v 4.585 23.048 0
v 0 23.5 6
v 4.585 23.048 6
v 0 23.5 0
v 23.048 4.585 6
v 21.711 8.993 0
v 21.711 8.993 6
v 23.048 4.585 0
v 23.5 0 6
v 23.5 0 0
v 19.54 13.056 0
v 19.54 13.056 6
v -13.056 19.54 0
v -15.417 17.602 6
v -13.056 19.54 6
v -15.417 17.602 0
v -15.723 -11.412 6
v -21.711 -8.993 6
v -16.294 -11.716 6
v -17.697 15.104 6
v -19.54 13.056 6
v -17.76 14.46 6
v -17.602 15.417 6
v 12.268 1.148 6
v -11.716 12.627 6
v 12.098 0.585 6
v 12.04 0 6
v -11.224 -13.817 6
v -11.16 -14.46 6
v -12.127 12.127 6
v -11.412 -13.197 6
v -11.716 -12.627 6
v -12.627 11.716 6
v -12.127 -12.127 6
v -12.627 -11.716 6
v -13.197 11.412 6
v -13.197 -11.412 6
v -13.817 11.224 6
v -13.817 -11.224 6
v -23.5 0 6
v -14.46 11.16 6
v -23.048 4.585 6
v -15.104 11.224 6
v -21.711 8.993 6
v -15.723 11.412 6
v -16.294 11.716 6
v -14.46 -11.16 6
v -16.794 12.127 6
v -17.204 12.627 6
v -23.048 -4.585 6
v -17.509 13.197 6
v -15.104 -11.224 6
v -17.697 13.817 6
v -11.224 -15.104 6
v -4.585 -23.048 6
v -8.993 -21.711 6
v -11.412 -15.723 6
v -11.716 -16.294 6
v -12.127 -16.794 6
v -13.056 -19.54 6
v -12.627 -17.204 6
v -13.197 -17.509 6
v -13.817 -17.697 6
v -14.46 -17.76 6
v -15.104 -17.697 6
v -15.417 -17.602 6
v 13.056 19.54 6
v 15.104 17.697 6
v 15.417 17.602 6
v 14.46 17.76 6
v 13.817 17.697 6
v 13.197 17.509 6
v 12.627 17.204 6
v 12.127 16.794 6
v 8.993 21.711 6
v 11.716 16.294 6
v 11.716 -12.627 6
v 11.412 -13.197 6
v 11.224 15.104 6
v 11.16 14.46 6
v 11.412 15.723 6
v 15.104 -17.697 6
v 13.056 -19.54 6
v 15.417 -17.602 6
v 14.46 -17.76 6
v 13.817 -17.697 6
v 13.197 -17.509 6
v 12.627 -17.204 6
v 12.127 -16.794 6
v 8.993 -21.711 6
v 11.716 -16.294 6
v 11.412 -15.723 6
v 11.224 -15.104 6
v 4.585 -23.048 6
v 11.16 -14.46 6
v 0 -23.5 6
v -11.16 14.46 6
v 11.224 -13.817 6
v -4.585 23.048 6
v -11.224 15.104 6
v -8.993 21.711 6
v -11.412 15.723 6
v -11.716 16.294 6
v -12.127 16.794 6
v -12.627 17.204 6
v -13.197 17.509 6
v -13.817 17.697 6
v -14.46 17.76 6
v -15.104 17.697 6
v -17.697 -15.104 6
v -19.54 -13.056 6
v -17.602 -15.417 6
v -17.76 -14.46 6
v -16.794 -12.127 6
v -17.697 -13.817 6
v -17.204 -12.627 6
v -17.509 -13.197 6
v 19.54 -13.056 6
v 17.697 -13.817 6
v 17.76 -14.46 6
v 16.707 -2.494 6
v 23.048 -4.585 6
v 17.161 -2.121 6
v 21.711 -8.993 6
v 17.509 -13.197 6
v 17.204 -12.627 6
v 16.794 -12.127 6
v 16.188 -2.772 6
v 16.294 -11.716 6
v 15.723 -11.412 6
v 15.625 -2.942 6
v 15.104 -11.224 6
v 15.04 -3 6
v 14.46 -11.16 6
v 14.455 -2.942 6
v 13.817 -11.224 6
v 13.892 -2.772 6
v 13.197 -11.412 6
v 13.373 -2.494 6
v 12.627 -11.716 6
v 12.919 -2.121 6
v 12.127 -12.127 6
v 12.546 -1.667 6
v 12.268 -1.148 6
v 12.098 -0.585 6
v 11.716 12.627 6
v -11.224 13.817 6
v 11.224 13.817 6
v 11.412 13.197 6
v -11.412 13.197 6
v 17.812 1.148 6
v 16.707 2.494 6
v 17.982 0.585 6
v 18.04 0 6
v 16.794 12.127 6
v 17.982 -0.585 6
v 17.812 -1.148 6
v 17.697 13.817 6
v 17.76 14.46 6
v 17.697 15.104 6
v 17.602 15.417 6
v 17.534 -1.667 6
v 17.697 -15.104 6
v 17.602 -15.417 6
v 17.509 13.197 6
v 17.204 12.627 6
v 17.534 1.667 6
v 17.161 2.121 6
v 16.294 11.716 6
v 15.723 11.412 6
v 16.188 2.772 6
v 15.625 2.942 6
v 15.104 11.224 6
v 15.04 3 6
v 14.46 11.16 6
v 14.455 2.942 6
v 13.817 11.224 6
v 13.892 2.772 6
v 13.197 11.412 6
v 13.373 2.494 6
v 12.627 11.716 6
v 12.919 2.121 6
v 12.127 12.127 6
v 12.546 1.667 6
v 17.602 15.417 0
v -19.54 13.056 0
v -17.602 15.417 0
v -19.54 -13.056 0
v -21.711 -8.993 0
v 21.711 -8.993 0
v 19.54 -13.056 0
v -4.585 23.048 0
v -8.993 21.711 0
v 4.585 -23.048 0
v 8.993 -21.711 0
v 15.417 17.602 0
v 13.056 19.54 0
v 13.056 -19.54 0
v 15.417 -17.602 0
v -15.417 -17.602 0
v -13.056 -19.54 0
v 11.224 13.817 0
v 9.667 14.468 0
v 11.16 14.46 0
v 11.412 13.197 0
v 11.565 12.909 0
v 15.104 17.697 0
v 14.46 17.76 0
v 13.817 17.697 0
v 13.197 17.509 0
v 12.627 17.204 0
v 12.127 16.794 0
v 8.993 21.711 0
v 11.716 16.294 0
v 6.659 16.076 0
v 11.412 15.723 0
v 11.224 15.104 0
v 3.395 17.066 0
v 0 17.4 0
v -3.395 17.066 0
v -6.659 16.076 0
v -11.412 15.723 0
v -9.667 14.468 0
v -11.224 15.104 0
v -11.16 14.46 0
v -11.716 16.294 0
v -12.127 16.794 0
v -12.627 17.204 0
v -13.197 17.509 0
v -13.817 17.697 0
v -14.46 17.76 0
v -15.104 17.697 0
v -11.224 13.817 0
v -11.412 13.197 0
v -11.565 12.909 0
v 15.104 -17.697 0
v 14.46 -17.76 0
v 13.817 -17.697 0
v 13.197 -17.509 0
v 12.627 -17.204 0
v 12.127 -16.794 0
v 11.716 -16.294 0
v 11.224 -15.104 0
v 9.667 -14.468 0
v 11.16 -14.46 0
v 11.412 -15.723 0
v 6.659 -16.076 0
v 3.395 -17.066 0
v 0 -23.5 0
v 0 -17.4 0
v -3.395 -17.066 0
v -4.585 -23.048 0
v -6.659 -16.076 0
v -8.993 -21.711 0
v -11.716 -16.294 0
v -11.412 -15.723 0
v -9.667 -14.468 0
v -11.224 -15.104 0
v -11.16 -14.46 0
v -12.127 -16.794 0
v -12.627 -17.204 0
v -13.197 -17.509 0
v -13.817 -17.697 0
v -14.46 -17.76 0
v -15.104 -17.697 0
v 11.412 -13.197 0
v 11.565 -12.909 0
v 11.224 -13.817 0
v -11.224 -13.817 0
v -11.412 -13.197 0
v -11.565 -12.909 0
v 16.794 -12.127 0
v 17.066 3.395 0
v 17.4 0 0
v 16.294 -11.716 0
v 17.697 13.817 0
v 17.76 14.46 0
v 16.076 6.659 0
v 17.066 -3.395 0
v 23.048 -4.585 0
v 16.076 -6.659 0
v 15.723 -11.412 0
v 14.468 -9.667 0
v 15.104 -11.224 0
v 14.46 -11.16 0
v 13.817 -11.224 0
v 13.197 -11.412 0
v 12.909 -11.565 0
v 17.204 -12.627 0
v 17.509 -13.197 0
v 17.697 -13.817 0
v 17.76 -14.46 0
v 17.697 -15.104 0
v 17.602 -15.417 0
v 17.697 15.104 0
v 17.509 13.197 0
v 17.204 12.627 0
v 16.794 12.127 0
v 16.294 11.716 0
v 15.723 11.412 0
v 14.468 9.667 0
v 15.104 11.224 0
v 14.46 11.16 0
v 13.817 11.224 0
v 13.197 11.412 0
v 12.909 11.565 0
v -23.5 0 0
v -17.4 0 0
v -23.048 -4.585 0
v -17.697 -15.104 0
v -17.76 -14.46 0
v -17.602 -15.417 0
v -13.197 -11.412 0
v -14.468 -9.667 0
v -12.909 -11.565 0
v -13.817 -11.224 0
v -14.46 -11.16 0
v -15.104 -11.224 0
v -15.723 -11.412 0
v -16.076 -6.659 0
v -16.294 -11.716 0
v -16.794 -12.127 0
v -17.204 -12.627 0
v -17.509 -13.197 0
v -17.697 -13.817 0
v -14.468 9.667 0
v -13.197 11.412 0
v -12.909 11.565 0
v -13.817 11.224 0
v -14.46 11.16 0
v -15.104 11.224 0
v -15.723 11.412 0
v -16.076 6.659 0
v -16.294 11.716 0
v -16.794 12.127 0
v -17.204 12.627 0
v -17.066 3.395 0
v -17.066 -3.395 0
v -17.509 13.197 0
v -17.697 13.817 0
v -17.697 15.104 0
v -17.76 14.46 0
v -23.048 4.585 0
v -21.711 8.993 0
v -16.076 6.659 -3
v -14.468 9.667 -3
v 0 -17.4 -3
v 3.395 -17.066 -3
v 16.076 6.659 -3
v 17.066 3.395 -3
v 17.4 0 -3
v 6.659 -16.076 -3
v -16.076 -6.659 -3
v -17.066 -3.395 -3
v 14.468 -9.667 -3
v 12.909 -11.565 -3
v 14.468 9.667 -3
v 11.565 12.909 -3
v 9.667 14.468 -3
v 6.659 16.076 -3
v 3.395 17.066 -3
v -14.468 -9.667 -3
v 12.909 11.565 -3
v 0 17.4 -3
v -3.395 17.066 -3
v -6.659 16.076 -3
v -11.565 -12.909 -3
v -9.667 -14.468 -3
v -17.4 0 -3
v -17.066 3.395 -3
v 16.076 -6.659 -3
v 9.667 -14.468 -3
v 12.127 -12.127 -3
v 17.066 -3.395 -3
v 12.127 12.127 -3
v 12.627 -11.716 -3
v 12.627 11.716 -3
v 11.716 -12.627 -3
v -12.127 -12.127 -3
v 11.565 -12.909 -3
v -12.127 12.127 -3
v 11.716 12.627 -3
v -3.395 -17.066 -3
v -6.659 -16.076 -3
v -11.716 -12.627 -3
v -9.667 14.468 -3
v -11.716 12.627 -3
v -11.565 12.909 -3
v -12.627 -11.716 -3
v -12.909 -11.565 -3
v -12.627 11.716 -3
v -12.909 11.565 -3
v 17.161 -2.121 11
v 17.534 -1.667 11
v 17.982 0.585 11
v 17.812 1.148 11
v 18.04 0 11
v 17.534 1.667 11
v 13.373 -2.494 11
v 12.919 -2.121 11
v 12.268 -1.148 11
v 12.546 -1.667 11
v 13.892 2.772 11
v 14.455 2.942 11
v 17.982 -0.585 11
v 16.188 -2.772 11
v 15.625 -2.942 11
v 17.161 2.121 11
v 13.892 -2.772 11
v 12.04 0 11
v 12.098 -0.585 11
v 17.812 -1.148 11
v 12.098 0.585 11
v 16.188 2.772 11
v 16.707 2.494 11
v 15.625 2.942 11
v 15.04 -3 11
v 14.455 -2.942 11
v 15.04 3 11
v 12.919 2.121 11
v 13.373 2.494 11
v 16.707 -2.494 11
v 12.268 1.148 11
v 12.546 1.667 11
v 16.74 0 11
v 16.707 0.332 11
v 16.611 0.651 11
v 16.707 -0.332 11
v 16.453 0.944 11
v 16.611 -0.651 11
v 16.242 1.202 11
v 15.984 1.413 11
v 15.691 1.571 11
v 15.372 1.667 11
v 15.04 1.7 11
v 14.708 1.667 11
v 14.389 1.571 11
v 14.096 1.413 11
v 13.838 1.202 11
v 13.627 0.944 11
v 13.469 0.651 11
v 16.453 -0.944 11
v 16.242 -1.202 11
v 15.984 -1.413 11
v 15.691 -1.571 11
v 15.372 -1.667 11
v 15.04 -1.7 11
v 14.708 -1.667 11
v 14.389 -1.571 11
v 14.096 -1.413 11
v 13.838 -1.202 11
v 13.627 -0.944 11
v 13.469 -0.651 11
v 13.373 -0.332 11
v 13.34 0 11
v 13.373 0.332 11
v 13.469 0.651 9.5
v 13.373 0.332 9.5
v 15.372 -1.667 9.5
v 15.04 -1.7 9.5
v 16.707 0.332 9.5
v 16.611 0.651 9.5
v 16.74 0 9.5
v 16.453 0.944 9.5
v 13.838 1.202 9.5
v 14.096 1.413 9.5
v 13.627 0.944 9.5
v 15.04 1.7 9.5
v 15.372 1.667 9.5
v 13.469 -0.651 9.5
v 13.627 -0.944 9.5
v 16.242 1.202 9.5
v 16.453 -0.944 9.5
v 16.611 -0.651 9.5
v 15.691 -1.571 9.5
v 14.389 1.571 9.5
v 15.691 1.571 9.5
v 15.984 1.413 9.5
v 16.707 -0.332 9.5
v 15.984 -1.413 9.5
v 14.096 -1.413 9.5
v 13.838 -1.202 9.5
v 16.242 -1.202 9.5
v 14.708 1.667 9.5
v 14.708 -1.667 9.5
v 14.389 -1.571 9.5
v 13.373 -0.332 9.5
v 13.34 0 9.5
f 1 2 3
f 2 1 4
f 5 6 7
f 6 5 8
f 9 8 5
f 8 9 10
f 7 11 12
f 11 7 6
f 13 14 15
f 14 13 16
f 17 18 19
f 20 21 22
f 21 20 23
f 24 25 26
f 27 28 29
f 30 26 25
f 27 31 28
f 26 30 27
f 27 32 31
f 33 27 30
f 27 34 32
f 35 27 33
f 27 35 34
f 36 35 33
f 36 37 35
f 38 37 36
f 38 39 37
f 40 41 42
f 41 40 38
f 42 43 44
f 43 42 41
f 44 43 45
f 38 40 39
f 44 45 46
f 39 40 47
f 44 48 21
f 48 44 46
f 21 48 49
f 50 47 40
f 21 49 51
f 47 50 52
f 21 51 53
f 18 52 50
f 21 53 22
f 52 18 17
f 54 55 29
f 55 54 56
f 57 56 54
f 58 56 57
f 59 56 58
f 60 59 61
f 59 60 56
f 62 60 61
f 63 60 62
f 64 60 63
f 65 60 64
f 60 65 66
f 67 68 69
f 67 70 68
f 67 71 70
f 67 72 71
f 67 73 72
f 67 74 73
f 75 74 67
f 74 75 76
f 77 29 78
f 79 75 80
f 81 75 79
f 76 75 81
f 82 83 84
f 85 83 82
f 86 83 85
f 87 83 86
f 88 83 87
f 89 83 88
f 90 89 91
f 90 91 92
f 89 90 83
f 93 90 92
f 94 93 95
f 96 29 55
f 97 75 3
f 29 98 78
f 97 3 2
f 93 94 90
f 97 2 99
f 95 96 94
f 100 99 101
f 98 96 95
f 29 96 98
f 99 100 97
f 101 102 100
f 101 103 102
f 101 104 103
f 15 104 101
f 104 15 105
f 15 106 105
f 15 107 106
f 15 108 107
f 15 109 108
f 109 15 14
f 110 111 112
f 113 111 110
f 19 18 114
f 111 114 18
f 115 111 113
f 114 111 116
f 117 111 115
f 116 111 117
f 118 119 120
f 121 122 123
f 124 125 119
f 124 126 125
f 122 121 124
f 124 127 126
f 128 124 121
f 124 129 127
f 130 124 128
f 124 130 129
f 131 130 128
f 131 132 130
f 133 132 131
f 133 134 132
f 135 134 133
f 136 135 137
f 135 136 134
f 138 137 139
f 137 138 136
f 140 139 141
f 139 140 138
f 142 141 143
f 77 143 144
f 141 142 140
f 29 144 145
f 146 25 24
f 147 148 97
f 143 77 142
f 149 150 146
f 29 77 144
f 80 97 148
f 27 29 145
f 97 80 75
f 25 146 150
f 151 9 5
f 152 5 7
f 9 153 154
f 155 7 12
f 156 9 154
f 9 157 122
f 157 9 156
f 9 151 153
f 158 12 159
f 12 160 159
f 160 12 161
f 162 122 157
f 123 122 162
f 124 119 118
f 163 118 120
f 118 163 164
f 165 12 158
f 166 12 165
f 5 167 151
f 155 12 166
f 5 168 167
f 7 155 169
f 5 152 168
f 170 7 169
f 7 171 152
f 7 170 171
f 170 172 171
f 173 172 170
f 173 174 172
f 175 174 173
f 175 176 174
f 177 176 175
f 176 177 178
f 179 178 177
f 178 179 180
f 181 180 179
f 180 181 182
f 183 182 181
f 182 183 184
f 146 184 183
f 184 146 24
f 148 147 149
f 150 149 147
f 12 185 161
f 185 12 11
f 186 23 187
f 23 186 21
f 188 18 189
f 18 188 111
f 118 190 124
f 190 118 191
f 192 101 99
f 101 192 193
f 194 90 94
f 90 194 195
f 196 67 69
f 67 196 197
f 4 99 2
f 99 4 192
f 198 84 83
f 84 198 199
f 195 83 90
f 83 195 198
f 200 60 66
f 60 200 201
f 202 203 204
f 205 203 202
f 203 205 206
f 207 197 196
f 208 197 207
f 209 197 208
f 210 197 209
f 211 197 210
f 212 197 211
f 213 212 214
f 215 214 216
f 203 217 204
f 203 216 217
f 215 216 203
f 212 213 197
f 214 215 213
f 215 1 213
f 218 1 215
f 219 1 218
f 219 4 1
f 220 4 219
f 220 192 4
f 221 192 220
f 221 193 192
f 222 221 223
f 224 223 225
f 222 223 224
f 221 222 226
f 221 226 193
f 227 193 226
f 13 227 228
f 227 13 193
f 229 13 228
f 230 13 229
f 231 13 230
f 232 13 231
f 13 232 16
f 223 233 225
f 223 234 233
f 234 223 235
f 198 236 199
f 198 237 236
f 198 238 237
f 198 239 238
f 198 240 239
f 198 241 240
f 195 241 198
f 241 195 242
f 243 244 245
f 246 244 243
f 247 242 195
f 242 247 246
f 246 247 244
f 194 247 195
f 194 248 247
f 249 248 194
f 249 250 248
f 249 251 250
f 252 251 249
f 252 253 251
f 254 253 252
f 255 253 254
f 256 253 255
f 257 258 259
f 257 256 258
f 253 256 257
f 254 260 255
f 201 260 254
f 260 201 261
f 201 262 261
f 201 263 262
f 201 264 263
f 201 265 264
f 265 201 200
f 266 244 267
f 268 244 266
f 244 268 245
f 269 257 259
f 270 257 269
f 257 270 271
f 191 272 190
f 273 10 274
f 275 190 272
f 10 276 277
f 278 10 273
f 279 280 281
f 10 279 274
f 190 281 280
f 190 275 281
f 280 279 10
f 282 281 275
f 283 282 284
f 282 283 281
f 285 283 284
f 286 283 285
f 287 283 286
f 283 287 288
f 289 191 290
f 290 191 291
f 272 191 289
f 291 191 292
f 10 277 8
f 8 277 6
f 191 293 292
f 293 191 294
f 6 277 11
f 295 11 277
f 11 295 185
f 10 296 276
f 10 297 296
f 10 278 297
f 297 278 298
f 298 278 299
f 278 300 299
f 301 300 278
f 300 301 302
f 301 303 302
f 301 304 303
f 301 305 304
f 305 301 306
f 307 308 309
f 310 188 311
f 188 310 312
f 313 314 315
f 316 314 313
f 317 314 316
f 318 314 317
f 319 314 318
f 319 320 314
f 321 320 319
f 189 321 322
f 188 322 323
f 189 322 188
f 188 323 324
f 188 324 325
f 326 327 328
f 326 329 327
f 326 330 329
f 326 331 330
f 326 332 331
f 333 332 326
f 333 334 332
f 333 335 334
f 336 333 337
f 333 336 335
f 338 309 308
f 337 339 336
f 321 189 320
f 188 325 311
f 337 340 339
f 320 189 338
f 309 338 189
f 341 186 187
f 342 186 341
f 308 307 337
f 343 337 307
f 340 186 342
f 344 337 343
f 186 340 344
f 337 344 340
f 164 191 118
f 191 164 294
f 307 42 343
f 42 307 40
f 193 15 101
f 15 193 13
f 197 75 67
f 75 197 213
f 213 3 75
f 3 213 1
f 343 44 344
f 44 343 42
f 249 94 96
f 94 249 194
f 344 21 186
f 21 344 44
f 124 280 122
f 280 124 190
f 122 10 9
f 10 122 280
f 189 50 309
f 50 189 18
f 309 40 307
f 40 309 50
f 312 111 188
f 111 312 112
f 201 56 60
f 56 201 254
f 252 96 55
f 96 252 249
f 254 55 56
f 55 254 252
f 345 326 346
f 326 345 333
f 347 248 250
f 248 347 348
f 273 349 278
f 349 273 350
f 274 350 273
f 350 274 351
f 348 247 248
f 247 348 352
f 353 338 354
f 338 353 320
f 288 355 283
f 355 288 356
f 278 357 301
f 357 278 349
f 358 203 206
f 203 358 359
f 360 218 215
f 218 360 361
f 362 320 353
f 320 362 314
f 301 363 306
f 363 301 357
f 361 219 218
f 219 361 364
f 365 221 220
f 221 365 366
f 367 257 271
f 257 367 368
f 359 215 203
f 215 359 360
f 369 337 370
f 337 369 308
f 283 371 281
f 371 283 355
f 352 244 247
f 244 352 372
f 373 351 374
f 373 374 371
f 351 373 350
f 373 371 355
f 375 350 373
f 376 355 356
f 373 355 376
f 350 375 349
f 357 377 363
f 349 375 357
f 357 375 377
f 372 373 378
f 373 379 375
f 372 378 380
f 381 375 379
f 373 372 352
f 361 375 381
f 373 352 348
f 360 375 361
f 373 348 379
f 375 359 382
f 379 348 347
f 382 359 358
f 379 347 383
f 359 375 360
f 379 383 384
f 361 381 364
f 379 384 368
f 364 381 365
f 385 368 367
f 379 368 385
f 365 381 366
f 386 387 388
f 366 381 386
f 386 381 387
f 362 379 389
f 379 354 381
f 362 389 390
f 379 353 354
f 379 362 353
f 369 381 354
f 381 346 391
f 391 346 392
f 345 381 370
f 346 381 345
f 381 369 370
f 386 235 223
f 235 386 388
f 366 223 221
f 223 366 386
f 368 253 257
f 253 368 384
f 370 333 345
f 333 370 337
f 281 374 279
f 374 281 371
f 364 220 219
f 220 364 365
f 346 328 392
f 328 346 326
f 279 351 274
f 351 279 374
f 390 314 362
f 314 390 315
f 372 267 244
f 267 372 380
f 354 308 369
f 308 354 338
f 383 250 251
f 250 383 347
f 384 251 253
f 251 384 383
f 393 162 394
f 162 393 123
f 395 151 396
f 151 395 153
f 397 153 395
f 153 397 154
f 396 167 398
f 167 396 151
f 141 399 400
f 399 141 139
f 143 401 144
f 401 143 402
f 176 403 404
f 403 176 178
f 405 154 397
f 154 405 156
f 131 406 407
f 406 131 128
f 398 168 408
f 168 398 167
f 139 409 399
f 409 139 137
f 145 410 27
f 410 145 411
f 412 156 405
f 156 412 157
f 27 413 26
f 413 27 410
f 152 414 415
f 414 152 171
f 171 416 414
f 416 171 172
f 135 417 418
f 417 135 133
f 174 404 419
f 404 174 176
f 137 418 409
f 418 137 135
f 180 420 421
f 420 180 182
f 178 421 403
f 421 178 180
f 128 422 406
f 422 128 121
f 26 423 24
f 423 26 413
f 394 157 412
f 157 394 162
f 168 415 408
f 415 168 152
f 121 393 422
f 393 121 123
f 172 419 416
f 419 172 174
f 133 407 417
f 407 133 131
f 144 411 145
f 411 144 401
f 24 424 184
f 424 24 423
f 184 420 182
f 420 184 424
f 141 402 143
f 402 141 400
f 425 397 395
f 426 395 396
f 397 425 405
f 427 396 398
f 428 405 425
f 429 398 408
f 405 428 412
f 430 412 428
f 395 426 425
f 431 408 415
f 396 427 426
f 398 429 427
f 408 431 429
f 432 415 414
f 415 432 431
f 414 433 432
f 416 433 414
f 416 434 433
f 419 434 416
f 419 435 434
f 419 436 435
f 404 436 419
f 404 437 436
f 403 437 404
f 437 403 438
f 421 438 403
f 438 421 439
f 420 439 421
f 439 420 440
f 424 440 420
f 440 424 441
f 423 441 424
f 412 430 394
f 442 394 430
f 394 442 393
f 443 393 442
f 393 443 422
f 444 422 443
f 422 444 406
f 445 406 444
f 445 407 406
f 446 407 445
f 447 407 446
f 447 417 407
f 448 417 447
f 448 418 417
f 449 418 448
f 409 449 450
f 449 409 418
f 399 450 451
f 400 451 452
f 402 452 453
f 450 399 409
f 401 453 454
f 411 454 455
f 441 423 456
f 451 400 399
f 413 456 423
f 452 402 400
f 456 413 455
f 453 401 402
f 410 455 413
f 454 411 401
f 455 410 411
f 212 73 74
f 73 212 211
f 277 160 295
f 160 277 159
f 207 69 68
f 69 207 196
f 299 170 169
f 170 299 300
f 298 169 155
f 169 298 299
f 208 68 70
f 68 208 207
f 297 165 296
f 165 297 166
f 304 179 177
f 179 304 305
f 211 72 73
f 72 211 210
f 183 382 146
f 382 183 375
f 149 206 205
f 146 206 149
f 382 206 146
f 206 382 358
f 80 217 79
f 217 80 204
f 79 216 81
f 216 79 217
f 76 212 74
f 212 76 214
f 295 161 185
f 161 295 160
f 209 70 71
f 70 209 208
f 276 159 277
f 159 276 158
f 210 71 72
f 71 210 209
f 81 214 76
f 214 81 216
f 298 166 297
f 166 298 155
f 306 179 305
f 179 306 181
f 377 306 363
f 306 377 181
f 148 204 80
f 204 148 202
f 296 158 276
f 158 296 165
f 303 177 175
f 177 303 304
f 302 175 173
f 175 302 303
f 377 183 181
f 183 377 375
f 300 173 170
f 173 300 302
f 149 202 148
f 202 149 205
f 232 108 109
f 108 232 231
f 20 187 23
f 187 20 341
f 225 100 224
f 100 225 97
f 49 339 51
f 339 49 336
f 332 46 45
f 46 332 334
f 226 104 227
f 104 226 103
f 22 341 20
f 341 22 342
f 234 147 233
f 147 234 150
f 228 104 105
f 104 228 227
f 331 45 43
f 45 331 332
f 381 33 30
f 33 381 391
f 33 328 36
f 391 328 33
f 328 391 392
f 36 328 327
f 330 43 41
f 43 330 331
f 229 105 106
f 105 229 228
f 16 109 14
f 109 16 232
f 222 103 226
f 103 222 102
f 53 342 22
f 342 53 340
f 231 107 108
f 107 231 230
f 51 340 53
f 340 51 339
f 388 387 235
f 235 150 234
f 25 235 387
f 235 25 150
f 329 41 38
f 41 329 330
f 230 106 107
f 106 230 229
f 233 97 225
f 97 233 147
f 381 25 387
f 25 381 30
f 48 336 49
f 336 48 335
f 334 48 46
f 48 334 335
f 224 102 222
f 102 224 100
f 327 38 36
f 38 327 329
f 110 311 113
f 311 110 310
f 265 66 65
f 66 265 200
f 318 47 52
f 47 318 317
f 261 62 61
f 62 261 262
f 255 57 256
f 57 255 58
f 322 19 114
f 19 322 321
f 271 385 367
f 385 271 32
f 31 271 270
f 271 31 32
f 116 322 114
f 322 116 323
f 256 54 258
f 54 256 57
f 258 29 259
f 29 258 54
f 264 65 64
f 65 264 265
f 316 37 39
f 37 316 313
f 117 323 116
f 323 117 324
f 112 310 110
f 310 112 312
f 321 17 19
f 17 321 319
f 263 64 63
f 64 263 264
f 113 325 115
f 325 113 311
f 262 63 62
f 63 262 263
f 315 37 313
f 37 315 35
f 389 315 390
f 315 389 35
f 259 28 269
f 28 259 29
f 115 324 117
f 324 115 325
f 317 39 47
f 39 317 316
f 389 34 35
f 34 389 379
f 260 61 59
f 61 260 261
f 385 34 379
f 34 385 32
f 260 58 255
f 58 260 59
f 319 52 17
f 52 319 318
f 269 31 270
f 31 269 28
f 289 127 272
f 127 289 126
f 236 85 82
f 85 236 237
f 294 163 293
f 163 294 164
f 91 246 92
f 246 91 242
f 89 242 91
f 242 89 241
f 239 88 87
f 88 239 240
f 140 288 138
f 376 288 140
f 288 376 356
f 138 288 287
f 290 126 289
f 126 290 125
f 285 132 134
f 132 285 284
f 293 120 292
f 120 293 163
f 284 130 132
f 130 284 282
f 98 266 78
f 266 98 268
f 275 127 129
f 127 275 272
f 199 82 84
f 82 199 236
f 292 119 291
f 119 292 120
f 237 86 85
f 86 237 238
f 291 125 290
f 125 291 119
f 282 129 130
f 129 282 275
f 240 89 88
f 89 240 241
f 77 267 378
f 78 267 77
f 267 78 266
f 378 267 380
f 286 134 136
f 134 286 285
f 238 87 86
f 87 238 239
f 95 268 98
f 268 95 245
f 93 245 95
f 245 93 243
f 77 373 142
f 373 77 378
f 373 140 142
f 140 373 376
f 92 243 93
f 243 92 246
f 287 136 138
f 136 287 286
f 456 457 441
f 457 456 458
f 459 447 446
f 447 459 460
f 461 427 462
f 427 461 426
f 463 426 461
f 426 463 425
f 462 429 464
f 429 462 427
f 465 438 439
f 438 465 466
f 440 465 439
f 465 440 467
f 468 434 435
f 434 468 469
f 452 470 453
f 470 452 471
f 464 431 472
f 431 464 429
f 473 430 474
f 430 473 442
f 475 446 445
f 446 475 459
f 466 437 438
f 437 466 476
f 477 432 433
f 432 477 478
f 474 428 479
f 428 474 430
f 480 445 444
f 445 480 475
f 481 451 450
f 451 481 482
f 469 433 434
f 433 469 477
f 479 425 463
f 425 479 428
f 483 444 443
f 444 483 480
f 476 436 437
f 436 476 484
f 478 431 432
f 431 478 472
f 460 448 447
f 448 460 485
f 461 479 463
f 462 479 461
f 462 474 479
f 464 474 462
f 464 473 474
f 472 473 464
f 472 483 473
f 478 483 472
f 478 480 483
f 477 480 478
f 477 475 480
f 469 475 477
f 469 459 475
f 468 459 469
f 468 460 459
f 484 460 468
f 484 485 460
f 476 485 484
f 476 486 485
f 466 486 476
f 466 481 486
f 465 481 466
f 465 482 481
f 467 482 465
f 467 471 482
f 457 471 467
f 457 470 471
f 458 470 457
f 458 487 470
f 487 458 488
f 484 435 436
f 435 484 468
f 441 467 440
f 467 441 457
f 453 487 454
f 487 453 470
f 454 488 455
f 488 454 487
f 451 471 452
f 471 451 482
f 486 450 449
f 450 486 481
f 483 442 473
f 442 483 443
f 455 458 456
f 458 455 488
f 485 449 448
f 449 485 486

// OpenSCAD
$fn = 32;

// ----------------------------------------------------------------------
// Retaining cap: 6202 cover, 47 mm, spigot 34.8 mm
// ----------------------------------------------------------------------

// --- parameters (mm) ---
cap_d = 47;               // cover diameter
cap_t = 6;                // cover thickness
lip_d = 34.8;             // spigot that enters the housing
lip_h = 3;                // spigot height
bolt_d = 6.6;             // bolt clearance
bolt_r = 20.45;           // bolt circle radius
nipple_d = 6;             // grease nipple boss
nipple_h = 5;             // grease nipple boss height

module cover() {
  cylinder(h = cap_t, d = cap_d);
}

module spigot() {
  /* sunk 1 mm into the cover; the spigot sets the overall height */
  translate([0, 0, -lip_h]) cylinder(h = lip_h + 1, d = lip_d);
}

module nipple() {
  translate([cap_d * 0.32, 0, cap_t - 1])
    cylinder(h = nipple_h + 1, d = nipple_d);
}

difference() {
  union() {
    cover();
    spigot();
    nipple();
  }
  for (i = [0 : 3]) rotate([0, 0, 45 + i * 90]) translate([bolt_r, 0, -lip_h - 1])
    cylinder(h = lip_h + cap_t + 2, d = bolt_d);
  translate([cap_d * 0.32, 0, cap_t + nipple_h - 1.5]) cylinder(h = 4, d = 3.4);
}
